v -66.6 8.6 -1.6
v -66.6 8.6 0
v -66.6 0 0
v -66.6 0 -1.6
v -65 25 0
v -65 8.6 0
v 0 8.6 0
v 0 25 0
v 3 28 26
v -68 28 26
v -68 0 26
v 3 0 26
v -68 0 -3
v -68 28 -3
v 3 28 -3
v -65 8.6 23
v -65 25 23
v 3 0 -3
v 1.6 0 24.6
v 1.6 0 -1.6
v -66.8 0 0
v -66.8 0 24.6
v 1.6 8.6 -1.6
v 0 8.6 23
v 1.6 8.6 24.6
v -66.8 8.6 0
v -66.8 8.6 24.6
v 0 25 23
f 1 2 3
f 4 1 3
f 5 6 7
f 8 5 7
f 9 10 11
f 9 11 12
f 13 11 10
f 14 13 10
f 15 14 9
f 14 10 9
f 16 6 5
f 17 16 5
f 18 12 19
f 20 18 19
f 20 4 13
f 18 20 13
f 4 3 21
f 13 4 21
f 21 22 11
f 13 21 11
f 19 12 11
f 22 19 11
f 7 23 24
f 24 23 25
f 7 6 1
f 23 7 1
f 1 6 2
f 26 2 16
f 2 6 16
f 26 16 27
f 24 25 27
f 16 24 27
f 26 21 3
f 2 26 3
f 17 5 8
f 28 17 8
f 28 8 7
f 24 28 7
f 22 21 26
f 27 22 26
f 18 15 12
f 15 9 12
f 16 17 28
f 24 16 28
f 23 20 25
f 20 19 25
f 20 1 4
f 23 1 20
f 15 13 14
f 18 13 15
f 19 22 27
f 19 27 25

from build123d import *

# Parameters (mm, degrees)
F1_DEPTH = 23
F3_DEPTH = 3
F5_DEPTH = 1.6
F7_DEPTH = 3
F9_DEPTH = 1.6


with BuildPart() as f1:
    # F0 (on Top) → F1 (new body)
    with BuildSketch(Plane.XY):
        Polygon((-65, 25), (0, 25), (0, 8.6), (1.6, 8.6), (1.6, 0), (3, 0), (3, 28), (-68, 28), (-68, 0), (-66.8, 0), (-66.8, 8.6), (-65, 8.6), align=None)
    extrude(amount=F1_DEPTH)

    # F2 (on face) → F3 (join)
    with BuildSketch(Plane.XY.offset(23)):
        Polygon((3, 28), (-68, 28), (-68, 0), (-66.8, 0), (-66.8, 8.6), (-65, 8.6), (-65, 25), (0, 25), (0, 8.6), (1.6, 8.6), (1.6, 0), (3, 0), align=None)
        Polygon((-66.8, 8.6), (-66.8, 0), (1.6, 0), (1.6, 8.6), (0, 8.6), (0, 25), (-65, 25), (-65, 8.6), align=None)
    extrude(amount=F3_DEPTH)

    # F4 (on face) → F5 (cut)
    with BuildSketch(Plane(origin=(0, 0, 23), x_dir=(1, 0, 0), z_dir=(0, 0, -1))):
        Polygon((1.6, 0), (-66.8, 0), (-66.8, -8.6), (-65, -8.6), (0, -8.6), (1.6, -8.6), align=None)
    extrude(amount=-F5_DEPTH, mode=Mode.SUBTRACT)

    # F6 (on face) → F7 (join)
    with BuildSketch(Plane(origin=(0, 0, 0), x_dir=(1, 0, 0), z_dir=(0, 0, -1))):
        Polygon((-66.8, 0), (-68, 0), (-68, -28), (3, -28), (3, 0), (1.6, 0), (1.6, -8.6), (0, -8.6), (0, -25), (-65, -25), (-65, -8.6), (-66.8, -8.6), align=None)
        Polygon((1.6, 0), (-66.8, 0), (-66.8, -8.6), (-65, -8.6), (-65, -25), (0, -25), (0, -8.6), (1.6, -8.6), align=None)
    extrude(amount=F7_DEPTH)

    # F8 (on face) → F9 (cut)
    with BuildSketch(Plane.XY):
        Polygon((-65, 8.6), (-66.6, 8.6), (-66.6, 0), (1.6, 0), (1.6, 8.6), (0, 8.6), align=None)
    extrude(amount=-F9_DEPTH, mode=Mode.SUBTRACT)


solid = f1.part
